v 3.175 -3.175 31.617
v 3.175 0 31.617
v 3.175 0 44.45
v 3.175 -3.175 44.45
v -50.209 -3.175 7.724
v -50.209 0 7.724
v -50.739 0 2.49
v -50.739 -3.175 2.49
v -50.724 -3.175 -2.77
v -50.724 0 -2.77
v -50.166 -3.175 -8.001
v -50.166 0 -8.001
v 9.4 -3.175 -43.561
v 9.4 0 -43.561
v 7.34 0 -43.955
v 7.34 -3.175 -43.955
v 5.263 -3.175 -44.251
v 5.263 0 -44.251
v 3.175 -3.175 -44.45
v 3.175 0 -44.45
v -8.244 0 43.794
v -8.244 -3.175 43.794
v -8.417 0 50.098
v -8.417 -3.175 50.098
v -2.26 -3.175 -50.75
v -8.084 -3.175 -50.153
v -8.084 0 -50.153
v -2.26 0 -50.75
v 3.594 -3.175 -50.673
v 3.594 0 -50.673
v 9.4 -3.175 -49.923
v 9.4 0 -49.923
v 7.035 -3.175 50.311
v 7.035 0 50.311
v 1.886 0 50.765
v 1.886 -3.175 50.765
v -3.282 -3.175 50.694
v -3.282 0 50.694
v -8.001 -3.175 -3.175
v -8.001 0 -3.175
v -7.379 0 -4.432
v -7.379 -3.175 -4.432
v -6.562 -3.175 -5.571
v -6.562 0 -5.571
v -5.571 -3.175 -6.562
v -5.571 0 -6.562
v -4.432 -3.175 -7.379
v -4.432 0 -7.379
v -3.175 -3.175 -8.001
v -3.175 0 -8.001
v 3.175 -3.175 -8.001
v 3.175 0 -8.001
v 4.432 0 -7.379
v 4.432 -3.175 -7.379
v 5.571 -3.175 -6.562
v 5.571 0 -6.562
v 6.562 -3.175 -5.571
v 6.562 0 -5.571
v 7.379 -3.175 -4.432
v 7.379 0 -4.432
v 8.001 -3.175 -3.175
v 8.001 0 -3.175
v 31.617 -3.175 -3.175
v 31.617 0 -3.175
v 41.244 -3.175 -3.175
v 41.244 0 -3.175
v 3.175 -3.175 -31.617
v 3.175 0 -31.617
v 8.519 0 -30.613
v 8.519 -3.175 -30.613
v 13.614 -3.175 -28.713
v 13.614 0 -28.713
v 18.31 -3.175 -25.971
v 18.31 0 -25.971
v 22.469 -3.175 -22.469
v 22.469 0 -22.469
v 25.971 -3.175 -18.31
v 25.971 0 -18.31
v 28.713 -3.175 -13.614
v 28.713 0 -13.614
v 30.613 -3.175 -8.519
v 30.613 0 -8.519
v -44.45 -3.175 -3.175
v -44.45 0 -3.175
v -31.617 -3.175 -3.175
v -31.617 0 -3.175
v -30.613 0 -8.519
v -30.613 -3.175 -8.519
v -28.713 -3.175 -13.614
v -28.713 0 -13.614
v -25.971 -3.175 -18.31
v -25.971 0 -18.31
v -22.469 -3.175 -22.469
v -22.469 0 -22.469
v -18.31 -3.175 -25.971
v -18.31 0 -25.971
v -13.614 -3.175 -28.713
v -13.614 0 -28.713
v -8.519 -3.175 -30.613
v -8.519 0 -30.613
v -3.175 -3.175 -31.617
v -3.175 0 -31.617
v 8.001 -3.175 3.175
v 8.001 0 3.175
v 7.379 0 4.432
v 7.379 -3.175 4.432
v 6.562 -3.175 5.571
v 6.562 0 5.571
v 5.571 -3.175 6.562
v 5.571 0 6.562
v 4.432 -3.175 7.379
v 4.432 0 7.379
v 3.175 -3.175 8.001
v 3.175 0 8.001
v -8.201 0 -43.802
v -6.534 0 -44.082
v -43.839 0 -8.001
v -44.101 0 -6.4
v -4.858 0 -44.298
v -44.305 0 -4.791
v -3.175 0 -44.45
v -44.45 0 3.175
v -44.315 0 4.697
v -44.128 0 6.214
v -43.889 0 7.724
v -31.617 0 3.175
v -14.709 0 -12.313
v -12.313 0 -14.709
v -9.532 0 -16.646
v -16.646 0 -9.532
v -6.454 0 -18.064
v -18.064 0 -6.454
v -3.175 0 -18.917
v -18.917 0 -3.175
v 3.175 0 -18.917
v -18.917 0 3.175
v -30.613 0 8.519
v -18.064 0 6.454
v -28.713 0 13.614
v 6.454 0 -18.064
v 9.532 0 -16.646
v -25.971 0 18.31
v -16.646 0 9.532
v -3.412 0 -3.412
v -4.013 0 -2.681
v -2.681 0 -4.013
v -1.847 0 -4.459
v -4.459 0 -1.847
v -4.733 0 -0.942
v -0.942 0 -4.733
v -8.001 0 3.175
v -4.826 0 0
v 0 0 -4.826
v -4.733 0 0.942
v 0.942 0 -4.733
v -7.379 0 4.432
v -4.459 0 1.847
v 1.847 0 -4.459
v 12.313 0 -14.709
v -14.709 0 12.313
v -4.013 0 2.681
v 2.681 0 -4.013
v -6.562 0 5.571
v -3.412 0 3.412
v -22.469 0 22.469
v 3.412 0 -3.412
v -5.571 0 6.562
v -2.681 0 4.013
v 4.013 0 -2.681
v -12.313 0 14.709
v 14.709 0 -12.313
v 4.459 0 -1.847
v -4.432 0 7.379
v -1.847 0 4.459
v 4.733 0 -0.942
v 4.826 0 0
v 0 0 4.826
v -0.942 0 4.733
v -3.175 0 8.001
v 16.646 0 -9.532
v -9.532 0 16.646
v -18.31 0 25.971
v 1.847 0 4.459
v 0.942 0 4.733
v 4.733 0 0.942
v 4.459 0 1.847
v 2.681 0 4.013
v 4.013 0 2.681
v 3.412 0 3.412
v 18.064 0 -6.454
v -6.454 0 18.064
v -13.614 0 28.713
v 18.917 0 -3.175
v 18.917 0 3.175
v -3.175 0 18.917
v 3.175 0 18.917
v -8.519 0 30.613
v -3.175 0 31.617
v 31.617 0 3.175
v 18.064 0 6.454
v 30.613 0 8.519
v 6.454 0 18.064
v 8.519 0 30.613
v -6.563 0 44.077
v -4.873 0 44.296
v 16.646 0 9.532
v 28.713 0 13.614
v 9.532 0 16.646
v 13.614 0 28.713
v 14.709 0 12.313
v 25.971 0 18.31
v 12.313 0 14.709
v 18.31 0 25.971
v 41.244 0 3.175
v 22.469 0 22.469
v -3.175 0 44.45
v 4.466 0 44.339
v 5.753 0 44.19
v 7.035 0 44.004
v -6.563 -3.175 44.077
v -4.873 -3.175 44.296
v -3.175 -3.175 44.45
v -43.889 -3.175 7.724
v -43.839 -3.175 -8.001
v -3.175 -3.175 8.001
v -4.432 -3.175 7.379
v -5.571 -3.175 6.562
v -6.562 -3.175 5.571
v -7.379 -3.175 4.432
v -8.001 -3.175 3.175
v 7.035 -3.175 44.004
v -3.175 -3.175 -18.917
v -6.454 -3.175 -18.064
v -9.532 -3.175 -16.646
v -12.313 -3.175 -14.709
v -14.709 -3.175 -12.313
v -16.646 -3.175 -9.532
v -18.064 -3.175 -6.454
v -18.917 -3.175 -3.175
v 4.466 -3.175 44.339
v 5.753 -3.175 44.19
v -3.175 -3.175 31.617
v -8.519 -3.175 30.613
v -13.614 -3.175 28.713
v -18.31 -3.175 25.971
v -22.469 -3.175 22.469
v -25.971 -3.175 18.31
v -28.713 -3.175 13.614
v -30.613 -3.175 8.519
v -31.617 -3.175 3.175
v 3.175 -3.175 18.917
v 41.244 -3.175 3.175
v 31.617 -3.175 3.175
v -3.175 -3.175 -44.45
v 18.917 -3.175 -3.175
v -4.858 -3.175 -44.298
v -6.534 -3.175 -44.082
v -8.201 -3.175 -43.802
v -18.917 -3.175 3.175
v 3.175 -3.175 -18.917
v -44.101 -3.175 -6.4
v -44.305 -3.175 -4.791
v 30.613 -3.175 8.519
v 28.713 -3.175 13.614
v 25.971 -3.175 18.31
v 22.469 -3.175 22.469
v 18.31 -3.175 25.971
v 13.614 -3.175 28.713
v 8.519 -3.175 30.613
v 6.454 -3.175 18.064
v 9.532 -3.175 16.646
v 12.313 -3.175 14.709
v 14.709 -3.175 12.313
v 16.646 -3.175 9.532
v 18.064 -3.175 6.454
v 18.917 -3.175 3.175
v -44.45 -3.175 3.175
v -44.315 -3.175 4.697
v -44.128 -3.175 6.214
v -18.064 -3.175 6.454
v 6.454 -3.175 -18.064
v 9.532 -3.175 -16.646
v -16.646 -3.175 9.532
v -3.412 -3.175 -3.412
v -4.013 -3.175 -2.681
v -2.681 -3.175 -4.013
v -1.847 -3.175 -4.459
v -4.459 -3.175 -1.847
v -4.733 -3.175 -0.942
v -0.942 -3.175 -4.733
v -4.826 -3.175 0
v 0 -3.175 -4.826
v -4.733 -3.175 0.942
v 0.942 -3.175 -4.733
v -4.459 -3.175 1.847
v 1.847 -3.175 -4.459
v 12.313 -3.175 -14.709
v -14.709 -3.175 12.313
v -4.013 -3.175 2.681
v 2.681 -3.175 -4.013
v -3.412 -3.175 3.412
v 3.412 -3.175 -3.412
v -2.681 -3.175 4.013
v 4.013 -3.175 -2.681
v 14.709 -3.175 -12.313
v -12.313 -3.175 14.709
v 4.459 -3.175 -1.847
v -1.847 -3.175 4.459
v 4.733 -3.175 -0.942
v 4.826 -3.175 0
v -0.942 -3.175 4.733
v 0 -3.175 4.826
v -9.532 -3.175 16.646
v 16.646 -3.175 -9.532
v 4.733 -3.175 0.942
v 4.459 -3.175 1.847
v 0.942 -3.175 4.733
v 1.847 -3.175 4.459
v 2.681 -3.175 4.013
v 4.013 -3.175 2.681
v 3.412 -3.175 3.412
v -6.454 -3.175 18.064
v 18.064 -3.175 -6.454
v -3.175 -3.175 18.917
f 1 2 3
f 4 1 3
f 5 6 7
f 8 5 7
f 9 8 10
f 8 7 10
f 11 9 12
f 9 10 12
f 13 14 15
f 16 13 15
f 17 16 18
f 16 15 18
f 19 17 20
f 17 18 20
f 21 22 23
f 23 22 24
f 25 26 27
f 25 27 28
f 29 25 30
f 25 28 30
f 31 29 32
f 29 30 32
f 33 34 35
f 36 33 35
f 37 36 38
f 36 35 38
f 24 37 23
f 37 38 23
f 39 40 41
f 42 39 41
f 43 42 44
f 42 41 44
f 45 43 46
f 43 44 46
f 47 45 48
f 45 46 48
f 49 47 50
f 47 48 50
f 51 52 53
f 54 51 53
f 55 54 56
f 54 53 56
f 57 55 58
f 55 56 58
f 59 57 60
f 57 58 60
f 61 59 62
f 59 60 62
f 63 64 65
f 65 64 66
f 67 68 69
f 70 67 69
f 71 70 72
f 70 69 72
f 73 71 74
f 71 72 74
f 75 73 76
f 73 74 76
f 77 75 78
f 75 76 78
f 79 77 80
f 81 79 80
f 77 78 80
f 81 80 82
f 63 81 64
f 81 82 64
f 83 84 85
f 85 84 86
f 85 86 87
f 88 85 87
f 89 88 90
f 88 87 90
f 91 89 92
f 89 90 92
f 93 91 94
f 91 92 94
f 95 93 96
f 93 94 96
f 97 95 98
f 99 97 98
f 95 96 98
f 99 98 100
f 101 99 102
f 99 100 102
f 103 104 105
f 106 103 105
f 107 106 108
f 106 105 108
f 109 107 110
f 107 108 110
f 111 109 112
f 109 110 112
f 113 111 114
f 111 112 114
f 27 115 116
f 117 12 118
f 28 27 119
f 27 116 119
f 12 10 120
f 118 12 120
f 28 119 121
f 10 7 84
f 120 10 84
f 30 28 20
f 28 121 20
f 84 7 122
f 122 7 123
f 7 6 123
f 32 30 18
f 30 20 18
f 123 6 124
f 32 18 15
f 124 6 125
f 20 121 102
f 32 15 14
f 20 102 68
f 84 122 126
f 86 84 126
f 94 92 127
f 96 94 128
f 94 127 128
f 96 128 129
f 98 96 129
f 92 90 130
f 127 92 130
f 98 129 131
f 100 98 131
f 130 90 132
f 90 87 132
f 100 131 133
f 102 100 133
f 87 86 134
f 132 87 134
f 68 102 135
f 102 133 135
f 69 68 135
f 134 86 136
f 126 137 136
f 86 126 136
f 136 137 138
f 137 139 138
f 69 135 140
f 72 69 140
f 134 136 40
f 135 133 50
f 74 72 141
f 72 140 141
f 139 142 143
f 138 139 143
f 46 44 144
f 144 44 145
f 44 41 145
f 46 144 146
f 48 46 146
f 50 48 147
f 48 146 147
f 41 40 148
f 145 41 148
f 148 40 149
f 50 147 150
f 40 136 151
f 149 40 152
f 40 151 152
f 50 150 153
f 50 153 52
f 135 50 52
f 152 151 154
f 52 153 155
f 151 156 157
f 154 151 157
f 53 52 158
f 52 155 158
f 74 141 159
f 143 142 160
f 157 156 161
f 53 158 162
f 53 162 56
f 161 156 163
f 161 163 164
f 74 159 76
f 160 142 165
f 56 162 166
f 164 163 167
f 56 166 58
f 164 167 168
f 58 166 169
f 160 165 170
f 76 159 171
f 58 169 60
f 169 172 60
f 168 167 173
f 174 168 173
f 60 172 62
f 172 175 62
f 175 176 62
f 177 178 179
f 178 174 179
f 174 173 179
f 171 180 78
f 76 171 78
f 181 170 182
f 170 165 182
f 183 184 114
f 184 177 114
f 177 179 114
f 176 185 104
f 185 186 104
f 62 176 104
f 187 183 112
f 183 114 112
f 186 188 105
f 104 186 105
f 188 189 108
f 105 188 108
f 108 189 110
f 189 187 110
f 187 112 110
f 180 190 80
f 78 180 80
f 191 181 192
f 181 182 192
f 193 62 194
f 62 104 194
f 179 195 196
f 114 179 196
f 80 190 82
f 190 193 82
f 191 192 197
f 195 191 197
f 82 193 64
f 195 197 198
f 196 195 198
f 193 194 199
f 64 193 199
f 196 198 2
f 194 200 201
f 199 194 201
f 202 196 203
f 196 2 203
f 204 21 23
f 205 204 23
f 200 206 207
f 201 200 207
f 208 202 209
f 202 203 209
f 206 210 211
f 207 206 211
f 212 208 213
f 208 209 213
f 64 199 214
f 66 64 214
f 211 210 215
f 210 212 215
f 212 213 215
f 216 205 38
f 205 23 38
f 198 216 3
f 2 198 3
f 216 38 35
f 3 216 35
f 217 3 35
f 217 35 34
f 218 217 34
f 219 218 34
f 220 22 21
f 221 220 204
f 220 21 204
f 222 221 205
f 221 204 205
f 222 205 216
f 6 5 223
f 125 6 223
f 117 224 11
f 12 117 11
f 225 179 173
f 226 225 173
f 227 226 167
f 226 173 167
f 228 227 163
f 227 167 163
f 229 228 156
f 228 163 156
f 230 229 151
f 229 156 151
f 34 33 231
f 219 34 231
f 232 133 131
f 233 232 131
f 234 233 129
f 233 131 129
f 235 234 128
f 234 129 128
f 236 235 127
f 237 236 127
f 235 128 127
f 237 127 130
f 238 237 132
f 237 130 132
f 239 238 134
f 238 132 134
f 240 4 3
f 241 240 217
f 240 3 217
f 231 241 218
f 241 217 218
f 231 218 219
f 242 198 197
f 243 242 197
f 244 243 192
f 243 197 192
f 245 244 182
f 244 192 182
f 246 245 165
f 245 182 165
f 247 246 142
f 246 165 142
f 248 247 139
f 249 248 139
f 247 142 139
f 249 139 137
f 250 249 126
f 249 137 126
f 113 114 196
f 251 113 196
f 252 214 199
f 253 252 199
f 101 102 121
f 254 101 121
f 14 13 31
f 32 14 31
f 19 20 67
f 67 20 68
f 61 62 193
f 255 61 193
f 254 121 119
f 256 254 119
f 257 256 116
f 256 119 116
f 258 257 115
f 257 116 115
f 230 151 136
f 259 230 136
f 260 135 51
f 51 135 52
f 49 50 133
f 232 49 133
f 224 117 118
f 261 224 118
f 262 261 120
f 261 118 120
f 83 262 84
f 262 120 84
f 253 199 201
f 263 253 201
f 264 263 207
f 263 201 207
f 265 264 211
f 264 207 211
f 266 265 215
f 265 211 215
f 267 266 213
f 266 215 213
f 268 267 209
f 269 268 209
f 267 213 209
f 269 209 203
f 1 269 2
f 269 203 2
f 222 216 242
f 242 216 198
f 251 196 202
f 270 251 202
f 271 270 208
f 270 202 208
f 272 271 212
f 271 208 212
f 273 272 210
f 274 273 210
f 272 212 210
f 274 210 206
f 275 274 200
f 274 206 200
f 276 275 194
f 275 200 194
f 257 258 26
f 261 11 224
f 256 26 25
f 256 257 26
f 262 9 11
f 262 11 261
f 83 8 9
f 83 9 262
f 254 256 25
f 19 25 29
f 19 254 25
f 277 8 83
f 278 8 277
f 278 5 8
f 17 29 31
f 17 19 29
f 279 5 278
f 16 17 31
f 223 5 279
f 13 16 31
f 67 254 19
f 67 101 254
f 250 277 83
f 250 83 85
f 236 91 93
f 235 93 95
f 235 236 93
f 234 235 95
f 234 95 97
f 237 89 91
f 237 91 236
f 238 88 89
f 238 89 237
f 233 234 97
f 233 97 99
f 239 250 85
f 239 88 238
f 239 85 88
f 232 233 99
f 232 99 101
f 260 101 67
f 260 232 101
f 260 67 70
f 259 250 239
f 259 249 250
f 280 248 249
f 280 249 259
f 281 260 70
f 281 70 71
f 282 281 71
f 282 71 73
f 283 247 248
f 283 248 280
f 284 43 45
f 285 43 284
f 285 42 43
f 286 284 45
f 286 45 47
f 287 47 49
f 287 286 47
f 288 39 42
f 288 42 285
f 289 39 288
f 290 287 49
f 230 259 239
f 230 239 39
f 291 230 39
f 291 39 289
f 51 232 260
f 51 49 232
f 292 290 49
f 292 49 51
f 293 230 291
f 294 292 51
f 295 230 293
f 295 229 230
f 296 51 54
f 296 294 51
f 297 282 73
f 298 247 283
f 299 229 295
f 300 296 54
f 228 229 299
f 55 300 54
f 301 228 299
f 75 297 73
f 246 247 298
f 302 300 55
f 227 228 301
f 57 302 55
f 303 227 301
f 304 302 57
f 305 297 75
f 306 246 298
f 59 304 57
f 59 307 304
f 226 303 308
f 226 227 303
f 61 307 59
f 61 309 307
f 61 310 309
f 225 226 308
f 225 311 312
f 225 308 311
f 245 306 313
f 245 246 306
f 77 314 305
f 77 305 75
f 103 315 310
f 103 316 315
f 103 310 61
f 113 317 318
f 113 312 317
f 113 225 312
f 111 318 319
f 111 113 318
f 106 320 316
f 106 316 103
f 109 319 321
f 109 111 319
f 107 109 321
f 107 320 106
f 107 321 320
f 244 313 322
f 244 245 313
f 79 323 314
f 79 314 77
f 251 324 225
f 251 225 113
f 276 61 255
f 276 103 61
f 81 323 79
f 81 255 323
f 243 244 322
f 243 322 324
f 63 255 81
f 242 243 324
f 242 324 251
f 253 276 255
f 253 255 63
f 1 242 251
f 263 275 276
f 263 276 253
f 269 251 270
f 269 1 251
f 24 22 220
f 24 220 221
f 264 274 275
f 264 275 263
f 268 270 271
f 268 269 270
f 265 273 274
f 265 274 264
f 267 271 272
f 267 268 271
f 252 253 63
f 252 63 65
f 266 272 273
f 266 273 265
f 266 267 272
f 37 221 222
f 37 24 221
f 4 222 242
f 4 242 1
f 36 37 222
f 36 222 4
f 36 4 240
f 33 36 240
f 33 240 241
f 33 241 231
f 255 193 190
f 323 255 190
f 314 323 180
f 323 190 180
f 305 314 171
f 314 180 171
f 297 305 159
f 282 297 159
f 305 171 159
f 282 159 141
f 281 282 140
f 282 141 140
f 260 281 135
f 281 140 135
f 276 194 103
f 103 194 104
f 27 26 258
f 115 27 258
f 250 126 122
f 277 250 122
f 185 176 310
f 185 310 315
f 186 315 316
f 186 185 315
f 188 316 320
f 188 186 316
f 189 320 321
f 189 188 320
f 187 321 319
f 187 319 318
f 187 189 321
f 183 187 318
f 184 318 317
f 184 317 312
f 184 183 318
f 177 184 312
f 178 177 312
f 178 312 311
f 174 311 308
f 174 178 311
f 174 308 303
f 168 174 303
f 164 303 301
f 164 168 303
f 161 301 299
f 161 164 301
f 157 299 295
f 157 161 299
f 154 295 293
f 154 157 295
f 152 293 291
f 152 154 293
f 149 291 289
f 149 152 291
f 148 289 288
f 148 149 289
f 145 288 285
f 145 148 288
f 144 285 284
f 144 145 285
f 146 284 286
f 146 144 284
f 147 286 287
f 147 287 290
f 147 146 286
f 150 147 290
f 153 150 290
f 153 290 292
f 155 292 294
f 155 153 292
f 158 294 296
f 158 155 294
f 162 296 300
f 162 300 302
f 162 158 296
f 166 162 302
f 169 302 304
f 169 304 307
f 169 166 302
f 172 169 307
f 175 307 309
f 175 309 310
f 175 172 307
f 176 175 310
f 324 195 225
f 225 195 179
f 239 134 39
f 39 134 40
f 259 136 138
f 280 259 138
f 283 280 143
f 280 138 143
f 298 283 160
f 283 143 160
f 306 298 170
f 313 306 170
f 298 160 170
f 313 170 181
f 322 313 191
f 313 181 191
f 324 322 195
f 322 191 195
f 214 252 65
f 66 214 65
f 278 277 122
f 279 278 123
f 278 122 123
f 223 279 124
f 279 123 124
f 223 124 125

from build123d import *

# Parameters (mm, degrees)
F0_R     = 50.8
F0_R_2   = 4.826
F1_DEPTH = 3.175
F3_DEPTH = 25.4


with BuildPart() as f1:
    # F0 (on Front) → F1 (new body)
    with BuildSketch(Plane.XZ):
        Circle(F0_R)
        with BuildLine():
            Line((-3.175, -31.6174778593), (-3.175, -44.45))
            ThreePointArc((-3.175, -44.45), (-31.5109752705, -31.5109752705), (-44.45, -3.175))
            Line((-44.45, -3.175), (-31.6174778593, -3.175))
            ThreePointArc((-31.6174778593, -3.175), (-22.4693739475, -22.4693739475), (-3.175, -31.6174778593))
        make_face(mode=Mode.SUBTRACT)
        with BuildLine():
            ThreePointArc((-8.001, -3.175), (-6.0867325389, -6.0867325389), (-3.175, -8.001))
            Line((-3.175, -8.001), (-3.175, -18.9174778593))
            ThreePointArc((-3.175, -18.9174778593), (-13.5637677944, -13.5637677944), (-18.9174778593, -3.175))
            Line((-18.9174778593, -3.175), (-8.001, -3.175))
        make_face(mode=Mode.SUBTRACT)
        Circle(F0_R_2, mode=Mode.SUBTRACT)
        with BuildLine():
            Line((31.6174778593, -3.175), (44.45, -3.175))
            ThreePointArc((44.45, -3.175), (31.5109752705, -31.5109752705), (3.175, -44.45))
            Line((3.175, -44.45), (3.175, -31.6174778593))
            ThreePointArc((3.175, -31.6174778593), (22.4693739475, -22.4693739475), (31.6174778593, -3.175))
        make_face(mode=Mode.SUBTRACT)
        with BuildLine():
            ThreePointArc((3.175, -8.001), (6.0867325389, -6.0867325389), (8.001, -3.175))
            Line((8.001, -3.175), (18.9174778593, -3.175))
            ThreePointArc((18.9174778593, -3.175), (13.5637677944, -13.5637677944), (3.175, -18.9174778593))
            Line((3.175, -18.9174778593), (3.175, -8.001))
        make_face(mode=Mode.SUBTRACT)
        with BuildLine():
            Line((-3.175, 18.9174778593), (-3.175, 8.001))
            ThreePointArc((-3.175, 8.001), (-6.0867325389, 6.0867325389), (-8.001, 3.175))
            Line((-8.001, 3.175), (-18.9174778593, 3.175))
            ThreePointArc((-18.9174778593, 3.175), (-13.5637677944, 13.5637677944), (-3.175, 18.9174778593))
        make_face(mode=Mode.SUBTRACT)
        with BuildLine():
            ThreePointArc((-44.45, 3.175), (-31.5109752705, 31.5109752705), (-3.175, 44.45))
            Line((-3.175, 44.45), (-3.175, 37.9674778593))
            Line((-3.175, 37.9674778593), (-3.175, 31.6174778593))
            ThreePointArc((-3.175, 31.6174778593), (-22.4693739475, 22.4693739475), (-31.6174778593, 3.175))
            Line((-31.6174778593, 3.175), (-44.45, 3.175))
        make_face(mode=Mode.SUBTRACT)
        with BuildLine():
            ThreePointArc((8.001, 3.175), (6.0867325389, 6.0867325389), (3.175, 8.001))
            Line((3.175, 8.001), (3.175, 18.9174778593))
            ThreePointArc((3.175, 18.9174778593), (13.5637677944, 13.5637677944), (18.9174778593, 3.175))
            Line((18.9174778593, 3.175), (8.001, 3.175))
        make_face(mode=Mode.SUBTRACT)
        with BuildLine():
            Line((3.175, 37.9674778593), (3.175, 44.45))
            ThreePointArc((3.175, 44.45), (31.5109752705, 31.5109752705), (44.45, 3.175))
            Line((44.45, 3.175), (31.6174778593, 3.175))
            ThreePointArc((31.6174778593, 3.175), (22.4693739475, 22.4693739475), (3.175, 31.6174778593))
            Line((3.175, 31.6174778593), (3.175, 37.9674778593))
        make_face(mode=Mode.SUBTRACT)
    extrude(amount=F1_DEPTH)

    # F2 (on face) → F3 (cut)
    with BuildSketch(Plane.XZ.offset(3.175)):
        Polygon((-39.8937948048, 44.5096977055), (-53.3885769546, 7.7240979299), (-39.592076093, 7.7240979299), (-8.112732321, 39.0091240406), (-8.5013657808, 53.1942620873), align=None)
        Polygon((7.0348572917, 55.979128927), (7.0348572917, 38.4760089219), (40.1488728821, 8.9099211618), (41.2437692285, 8.9099211618), (41.2437692285, 11.4161195233), (53.2457668566, 13.9619985828), (46.2986193597, 36.3472476602), align=None)
        Polygon((41.2437692285, 11.4161195233), (41.2437692285, 8.9099211618), (54.8136532307, 8.9099211618), (53.2457668566, 13.9619985828), align=None)
        Polygon((54.8136532307, 8.9099211618), (41.2437692285, 8.9099211618), (41.2437692285, -6.7063555237), (56.2328249216, -6.7009725608), (55.2191524148, -9.5701087266), (60.481145978, -9.5701087266), (60.481145978, 15.4967764392), (53.2457668566, 13.9619985828), align=None)
        Polygon((41.2437692285, -9.5701087266), (41.2437692285, -6.7063555237), (39.6758913994, -6.7069185898), (9.4001442194, -39.3419340253), (9.4001442194, -54.716296494), (44.45, -40.0515161455), (55.2191524148, -9.5701087266), align=None)
        Polygon((56.2328249216, -6.7009725608), (41.2437692285, -6.7063555237), (41.2437692285, -9.5701087266), (55.2191524148, -9.5701087266), align=None)
        Polygon((-8.001, -54.6349138021), (-8.3070490509, -38.0337389297), (-39.696149528, -8.001), (-54.2215406895, -8.001), (-44.45, -37.7750843763), align=None)
    extrude(amount=-F3_DEPTH, mode=Mode.SUBTRACT)


solid = f1.part
